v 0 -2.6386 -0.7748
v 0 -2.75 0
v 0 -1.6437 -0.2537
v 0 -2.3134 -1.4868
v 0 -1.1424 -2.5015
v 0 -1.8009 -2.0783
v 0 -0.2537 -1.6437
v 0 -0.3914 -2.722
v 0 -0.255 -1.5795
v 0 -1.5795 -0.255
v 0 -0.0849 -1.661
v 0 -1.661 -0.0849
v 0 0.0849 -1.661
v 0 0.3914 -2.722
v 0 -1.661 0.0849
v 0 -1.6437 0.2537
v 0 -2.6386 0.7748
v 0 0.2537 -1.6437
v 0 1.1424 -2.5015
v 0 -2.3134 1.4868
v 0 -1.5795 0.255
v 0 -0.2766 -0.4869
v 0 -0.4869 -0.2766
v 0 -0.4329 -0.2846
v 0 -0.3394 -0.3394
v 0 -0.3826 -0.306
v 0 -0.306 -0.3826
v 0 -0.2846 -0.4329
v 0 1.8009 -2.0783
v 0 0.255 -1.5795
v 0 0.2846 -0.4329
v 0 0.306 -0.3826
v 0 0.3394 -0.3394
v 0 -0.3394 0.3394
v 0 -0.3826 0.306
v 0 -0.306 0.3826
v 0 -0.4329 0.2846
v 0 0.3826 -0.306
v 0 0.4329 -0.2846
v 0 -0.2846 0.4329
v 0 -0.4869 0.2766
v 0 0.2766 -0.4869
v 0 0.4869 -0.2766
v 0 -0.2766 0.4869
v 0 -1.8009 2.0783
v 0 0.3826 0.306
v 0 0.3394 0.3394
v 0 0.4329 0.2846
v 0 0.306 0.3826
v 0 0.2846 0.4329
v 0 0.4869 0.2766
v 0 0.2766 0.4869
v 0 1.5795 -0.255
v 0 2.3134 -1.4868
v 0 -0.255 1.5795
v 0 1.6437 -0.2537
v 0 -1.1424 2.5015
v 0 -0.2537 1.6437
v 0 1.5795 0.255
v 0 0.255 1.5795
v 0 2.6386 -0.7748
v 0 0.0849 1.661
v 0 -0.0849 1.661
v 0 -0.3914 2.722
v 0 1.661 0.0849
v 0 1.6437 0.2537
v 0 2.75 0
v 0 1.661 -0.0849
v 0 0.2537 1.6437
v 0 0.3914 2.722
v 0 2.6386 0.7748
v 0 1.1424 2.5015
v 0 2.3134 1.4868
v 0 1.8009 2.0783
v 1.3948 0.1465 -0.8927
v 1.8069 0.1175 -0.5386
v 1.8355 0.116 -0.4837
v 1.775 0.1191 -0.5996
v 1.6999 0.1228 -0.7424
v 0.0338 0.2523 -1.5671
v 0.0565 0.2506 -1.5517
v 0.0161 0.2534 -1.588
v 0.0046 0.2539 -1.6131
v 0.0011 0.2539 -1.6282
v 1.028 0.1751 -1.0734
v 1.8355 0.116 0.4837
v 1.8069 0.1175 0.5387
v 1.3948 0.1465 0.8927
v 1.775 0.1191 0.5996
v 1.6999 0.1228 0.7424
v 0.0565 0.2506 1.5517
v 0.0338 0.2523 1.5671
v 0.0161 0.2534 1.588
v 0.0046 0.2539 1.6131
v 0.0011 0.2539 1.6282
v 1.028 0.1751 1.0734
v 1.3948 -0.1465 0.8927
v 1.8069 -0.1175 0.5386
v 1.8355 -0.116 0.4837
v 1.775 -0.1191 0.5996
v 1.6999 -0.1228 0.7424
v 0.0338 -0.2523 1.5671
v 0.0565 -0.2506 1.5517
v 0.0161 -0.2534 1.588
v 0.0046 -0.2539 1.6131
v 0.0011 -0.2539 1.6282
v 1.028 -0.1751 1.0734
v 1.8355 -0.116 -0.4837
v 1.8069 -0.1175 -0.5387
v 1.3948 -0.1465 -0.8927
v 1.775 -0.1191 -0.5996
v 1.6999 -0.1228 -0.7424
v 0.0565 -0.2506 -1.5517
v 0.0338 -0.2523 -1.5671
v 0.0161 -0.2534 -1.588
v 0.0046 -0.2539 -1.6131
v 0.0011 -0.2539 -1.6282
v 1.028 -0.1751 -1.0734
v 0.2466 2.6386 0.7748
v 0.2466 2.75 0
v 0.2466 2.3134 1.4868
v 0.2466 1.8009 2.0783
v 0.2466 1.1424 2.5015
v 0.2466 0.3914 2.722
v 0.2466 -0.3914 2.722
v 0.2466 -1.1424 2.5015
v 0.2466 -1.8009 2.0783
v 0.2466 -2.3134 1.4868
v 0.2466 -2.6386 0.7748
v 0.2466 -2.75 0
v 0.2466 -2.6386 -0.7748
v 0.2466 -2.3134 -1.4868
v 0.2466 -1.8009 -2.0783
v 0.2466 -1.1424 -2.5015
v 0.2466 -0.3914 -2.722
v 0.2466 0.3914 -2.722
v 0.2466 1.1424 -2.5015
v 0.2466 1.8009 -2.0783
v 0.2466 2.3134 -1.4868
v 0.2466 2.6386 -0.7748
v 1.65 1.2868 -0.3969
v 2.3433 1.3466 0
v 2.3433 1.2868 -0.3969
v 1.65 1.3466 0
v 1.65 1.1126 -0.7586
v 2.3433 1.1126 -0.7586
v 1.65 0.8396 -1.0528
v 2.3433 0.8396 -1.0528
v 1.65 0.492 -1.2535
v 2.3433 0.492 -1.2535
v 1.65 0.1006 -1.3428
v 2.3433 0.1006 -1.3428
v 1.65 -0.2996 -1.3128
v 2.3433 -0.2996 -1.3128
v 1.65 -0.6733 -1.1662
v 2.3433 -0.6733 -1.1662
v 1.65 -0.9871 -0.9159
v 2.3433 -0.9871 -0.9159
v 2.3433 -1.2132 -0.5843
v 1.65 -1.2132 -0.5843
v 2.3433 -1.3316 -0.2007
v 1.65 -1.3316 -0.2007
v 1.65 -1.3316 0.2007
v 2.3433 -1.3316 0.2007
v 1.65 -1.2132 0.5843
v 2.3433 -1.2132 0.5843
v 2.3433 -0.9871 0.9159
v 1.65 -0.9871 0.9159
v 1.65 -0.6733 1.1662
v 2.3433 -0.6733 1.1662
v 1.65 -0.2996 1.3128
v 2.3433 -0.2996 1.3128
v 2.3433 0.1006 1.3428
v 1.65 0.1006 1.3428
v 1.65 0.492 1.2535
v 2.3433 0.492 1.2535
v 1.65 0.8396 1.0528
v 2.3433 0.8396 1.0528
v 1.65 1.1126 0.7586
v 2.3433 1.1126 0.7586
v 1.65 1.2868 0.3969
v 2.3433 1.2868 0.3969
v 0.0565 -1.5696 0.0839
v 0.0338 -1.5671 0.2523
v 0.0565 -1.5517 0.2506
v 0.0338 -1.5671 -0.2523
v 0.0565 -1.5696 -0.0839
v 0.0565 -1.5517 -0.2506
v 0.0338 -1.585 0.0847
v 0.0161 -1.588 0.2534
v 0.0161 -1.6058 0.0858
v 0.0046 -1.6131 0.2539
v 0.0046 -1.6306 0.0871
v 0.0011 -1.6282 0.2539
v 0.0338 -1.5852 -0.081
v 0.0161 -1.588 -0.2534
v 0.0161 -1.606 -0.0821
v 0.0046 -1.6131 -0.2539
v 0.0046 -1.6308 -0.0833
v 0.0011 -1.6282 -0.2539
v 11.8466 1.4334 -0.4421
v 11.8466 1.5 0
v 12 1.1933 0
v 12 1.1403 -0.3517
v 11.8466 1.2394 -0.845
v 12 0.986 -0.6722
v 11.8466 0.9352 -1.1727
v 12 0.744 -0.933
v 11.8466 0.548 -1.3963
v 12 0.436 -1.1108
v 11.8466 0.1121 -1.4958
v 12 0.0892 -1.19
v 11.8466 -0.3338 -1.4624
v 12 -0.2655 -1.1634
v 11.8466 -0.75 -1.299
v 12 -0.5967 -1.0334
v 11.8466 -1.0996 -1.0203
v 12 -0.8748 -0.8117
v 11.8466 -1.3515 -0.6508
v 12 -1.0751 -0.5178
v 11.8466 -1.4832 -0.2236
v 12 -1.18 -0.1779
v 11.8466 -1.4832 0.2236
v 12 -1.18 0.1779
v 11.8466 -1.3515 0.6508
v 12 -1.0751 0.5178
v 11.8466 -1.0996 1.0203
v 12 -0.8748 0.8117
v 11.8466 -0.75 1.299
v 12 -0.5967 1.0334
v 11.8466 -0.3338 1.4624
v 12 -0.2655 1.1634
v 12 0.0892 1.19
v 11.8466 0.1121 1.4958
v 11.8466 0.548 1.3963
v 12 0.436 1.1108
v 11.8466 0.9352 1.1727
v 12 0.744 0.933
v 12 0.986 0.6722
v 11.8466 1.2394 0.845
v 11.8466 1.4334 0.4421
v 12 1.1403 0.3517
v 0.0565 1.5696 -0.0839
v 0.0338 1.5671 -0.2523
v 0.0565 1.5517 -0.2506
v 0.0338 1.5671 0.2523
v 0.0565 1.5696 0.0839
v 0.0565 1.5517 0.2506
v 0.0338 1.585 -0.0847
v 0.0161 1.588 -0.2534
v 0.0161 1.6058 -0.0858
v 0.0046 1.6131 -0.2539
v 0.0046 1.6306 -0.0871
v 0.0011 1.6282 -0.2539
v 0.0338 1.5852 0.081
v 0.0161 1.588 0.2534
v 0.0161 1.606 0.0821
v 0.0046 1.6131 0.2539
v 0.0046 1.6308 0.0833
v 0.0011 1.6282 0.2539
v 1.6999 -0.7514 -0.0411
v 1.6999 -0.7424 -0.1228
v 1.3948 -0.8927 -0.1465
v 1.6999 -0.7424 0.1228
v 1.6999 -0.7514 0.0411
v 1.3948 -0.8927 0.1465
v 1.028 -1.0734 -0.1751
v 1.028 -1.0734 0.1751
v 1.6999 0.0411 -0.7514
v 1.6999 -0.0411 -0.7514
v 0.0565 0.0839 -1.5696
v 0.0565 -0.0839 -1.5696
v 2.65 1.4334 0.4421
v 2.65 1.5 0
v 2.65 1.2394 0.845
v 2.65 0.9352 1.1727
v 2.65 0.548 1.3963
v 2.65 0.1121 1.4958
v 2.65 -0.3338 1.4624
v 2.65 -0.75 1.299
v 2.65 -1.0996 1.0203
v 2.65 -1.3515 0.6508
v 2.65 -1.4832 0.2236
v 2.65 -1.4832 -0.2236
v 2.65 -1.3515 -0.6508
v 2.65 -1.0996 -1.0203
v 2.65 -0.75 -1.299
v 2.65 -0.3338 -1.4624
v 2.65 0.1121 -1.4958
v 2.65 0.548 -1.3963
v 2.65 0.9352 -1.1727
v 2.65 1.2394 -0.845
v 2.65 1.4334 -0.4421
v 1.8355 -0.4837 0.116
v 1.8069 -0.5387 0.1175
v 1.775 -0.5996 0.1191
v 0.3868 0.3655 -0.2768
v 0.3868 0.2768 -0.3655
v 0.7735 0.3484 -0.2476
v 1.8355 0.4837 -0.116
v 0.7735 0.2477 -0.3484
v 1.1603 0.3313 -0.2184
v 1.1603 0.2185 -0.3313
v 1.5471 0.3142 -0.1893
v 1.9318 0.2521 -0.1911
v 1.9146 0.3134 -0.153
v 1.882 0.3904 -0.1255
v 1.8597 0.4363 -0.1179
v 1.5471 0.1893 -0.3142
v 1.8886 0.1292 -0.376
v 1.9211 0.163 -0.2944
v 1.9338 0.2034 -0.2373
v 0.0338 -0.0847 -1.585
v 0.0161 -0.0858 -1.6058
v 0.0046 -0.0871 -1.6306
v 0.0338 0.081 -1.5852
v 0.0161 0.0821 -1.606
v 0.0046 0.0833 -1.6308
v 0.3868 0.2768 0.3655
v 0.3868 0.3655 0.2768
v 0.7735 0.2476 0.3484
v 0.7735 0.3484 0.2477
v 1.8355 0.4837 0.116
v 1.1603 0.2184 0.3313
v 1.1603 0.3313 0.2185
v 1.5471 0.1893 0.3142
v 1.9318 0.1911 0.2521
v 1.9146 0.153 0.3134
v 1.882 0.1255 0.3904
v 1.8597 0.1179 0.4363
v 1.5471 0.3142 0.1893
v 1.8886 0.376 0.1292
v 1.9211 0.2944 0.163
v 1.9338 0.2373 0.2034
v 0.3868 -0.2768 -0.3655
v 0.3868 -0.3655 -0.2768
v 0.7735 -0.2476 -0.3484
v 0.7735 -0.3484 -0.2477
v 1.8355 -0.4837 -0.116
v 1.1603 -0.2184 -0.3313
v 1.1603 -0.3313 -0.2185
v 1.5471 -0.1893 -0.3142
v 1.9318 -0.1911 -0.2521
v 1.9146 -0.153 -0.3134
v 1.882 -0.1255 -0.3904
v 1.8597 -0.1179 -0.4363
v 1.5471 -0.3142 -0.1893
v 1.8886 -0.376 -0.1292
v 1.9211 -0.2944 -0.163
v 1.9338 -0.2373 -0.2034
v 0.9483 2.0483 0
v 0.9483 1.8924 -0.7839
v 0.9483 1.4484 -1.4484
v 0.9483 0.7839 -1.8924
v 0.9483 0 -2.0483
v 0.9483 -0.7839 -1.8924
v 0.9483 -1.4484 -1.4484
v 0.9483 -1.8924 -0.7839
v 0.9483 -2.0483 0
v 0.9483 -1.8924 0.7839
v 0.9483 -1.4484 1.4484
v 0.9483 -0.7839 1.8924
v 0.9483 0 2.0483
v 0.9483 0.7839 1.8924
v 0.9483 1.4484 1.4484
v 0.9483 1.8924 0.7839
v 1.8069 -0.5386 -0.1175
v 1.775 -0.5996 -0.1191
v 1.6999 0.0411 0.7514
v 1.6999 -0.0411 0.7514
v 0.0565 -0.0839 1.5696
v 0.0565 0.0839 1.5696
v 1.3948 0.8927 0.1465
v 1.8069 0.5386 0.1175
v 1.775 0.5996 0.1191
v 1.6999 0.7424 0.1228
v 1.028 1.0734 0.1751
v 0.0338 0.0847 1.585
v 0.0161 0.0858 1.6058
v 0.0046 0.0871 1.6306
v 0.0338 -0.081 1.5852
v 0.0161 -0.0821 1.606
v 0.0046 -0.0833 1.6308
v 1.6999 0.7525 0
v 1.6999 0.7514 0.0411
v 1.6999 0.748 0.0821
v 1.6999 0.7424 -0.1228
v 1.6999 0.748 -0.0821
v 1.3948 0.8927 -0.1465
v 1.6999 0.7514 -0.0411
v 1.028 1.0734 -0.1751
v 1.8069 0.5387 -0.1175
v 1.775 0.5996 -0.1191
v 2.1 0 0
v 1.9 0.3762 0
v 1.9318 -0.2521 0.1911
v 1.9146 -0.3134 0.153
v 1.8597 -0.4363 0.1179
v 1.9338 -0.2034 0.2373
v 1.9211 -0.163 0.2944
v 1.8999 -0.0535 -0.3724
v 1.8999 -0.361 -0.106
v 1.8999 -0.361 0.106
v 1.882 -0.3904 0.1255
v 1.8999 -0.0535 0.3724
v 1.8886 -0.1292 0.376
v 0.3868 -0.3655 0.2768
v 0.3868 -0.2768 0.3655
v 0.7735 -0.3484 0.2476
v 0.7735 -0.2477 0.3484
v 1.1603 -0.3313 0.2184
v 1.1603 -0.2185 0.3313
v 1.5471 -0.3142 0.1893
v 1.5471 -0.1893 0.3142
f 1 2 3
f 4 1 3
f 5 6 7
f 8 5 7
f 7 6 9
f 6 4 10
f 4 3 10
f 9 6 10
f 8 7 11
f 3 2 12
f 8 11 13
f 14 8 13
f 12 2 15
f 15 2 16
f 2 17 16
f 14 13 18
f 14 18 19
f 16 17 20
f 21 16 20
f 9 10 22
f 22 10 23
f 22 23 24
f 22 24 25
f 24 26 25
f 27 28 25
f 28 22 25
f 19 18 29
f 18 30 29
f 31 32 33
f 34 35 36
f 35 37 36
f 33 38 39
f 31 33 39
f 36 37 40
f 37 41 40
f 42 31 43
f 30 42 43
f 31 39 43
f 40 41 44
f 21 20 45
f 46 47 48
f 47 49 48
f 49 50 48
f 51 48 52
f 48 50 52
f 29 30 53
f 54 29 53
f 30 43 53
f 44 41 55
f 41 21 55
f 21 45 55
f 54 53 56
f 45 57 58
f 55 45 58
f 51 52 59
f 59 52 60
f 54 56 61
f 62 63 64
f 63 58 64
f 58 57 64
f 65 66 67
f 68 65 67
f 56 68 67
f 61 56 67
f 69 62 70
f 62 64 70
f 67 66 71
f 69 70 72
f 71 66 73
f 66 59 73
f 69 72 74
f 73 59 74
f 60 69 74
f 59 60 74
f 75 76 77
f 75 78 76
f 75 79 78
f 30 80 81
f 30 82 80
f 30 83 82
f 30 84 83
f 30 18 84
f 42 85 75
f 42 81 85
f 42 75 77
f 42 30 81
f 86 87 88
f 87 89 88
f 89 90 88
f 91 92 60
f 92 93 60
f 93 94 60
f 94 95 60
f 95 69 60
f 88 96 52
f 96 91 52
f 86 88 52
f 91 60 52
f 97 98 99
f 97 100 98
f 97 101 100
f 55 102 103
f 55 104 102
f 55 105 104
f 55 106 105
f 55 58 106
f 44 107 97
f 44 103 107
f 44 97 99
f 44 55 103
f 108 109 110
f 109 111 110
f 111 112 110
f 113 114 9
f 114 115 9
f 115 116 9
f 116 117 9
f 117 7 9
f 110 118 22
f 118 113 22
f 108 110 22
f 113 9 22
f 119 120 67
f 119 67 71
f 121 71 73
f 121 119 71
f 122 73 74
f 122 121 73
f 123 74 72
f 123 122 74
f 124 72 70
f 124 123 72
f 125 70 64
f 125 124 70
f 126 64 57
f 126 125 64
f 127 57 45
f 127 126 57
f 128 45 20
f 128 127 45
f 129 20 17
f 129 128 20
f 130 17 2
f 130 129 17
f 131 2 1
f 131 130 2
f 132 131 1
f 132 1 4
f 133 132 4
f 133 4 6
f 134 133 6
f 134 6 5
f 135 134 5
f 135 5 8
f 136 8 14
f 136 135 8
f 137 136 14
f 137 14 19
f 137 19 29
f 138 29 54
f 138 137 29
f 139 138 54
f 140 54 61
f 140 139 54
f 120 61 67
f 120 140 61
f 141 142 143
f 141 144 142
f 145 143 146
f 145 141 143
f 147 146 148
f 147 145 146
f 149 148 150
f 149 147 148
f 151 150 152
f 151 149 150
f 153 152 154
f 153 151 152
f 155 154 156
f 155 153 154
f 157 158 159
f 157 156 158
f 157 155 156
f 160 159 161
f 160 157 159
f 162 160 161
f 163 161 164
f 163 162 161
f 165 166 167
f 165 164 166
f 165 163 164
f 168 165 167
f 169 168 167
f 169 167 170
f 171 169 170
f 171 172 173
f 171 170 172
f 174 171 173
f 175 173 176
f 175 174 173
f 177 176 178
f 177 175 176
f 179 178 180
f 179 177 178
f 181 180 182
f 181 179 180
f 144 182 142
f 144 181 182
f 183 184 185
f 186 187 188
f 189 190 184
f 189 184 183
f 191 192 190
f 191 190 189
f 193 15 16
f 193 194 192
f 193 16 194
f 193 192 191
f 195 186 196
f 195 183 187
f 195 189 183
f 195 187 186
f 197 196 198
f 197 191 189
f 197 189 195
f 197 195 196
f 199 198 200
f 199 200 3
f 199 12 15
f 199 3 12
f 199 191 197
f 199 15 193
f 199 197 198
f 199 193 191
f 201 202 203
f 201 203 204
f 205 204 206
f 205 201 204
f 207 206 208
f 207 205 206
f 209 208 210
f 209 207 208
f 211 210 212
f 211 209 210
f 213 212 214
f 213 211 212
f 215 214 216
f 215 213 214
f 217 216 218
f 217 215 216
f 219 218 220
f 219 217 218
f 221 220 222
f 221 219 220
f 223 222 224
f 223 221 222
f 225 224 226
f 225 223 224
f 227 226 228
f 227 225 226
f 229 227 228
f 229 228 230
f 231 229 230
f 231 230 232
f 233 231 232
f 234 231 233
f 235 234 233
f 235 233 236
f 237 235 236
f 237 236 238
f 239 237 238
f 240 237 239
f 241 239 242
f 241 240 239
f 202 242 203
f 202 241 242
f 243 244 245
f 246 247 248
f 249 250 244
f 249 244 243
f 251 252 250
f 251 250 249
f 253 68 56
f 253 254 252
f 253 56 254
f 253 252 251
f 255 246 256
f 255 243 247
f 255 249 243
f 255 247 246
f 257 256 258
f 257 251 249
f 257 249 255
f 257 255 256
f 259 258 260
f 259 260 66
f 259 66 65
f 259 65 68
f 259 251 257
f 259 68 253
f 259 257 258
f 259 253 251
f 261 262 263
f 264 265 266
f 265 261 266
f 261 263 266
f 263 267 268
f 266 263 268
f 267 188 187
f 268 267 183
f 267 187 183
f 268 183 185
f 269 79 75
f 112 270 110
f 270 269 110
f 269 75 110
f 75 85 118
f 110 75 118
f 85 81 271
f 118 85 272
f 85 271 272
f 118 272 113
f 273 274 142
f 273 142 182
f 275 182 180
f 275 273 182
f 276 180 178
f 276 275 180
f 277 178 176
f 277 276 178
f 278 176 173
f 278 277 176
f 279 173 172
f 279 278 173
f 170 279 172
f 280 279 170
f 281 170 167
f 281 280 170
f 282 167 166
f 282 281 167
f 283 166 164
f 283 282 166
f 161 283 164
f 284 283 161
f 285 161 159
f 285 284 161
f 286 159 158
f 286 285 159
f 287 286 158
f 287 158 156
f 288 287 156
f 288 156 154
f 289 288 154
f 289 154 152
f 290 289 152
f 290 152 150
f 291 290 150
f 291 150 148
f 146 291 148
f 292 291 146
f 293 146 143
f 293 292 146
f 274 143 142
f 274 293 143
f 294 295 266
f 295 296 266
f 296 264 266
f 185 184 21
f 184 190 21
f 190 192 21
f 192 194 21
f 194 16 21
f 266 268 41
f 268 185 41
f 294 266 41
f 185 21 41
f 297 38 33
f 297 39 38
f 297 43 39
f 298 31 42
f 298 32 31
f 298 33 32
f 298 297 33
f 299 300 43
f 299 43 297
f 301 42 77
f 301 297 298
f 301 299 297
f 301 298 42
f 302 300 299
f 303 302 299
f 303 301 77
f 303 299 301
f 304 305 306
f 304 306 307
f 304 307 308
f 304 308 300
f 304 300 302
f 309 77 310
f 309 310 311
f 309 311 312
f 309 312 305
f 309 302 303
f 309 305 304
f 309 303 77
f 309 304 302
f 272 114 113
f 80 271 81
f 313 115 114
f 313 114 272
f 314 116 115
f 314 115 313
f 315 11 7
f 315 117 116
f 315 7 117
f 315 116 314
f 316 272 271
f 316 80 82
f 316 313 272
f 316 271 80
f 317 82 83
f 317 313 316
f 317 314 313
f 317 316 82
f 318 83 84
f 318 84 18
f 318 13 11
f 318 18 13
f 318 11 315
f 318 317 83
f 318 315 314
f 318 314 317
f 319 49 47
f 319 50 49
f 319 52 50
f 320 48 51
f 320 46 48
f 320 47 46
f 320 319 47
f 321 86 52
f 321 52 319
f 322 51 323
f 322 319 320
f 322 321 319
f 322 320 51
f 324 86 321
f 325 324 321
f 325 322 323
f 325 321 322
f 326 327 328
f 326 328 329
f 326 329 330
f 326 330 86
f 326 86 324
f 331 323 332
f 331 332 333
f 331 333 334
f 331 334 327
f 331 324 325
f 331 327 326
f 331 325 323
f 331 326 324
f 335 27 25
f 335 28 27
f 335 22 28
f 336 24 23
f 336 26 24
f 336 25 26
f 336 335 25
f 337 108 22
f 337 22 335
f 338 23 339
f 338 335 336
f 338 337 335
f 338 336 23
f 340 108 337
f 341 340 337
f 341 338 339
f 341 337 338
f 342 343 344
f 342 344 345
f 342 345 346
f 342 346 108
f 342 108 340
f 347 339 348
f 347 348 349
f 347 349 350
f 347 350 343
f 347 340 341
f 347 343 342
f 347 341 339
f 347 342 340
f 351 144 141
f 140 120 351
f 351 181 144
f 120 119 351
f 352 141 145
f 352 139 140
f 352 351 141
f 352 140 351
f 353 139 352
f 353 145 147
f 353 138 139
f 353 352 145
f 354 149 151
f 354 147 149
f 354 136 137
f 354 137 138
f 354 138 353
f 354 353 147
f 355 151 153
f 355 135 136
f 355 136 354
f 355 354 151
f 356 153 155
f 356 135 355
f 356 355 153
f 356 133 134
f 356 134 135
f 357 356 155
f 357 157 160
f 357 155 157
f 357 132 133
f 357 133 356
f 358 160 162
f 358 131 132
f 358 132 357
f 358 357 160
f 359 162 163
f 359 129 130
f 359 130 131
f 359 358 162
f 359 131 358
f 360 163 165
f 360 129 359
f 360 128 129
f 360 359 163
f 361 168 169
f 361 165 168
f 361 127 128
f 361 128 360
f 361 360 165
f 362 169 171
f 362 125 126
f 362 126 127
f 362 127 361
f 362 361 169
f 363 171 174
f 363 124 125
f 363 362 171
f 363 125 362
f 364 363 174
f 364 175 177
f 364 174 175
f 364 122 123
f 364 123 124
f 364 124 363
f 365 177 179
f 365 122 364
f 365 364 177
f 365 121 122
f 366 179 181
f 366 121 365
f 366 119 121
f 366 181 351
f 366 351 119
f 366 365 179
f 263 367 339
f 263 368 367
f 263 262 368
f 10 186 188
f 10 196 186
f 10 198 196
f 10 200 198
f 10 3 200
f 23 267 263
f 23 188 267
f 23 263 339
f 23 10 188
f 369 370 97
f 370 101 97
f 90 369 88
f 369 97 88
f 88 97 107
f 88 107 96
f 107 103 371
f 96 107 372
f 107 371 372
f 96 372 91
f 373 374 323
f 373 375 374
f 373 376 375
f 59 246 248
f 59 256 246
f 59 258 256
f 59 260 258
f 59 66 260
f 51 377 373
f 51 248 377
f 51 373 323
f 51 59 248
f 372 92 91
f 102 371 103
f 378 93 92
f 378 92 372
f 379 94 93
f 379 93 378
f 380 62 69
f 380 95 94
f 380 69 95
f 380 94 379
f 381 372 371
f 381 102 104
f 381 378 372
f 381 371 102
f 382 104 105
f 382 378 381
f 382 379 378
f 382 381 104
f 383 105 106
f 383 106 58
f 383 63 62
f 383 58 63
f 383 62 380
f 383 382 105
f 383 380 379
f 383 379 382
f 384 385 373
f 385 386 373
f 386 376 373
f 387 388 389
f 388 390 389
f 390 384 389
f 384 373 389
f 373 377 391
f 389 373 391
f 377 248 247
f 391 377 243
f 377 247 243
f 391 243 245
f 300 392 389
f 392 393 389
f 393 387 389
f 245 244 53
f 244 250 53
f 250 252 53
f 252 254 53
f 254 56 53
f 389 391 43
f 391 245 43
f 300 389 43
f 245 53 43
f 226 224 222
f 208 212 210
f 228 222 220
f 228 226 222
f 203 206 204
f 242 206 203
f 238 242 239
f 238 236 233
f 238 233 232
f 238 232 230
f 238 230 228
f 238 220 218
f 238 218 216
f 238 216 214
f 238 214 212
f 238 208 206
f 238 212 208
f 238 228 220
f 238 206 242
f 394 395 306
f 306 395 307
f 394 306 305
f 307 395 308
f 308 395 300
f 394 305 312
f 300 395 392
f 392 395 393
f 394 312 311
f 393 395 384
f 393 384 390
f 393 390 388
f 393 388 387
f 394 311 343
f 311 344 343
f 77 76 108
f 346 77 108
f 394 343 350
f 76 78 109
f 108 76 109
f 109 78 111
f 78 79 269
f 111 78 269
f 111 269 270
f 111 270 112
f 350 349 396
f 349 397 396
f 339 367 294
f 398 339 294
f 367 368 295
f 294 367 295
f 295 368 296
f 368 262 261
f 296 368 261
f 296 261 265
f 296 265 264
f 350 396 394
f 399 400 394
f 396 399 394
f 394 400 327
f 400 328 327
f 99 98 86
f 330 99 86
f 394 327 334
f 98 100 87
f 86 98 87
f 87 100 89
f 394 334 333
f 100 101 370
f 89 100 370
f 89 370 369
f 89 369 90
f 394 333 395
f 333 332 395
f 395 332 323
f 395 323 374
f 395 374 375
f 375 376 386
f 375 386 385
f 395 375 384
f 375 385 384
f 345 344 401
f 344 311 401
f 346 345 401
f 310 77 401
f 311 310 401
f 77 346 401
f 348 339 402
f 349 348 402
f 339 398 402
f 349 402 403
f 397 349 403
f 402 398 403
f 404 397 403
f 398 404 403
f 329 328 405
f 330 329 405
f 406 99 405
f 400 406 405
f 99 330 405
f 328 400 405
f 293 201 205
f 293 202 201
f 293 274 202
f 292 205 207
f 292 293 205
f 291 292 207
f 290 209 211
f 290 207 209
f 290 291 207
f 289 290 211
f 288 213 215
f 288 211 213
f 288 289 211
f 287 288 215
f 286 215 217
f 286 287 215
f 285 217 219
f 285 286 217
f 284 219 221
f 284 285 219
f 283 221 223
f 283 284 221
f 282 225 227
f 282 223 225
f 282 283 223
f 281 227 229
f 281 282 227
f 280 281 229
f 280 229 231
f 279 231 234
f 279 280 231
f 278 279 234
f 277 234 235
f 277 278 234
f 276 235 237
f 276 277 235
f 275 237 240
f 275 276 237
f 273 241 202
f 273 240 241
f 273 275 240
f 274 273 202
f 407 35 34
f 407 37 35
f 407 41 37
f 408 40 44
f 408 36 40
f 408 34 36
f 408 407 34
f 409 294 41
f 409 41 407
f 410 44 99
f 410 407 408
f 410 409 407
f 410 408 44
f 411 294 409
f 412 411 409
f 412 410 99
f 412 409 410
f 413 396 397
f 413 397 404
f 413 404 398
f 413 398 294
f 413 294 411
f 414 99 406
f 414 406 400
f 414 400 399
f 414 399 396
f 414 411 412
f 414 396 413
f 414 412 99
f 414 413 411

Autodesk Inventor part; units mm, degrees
ref_plane "YZ Plane" through (0, 0, 0) normal (1, 0, 0) x (0, 1, 0)
ref_plane "XZ Plane" through (0, 0, 0) normal (0, 1, 0) x (-1, 0, 0)
sketch "Sketch1" plane through (0, 0, 0) normal (0, 0, 1) x (1, 0, 0)
  line L0 (2.1, 0) -> (12, 0)
  line L1 (12, 0) -> (12, 1.5)
  line L2 (12, 1.5) -> (2.65, 1.5)
  line L3 (2.65, 1.5) -> (2.3433, 1.3466)
  line L4 (2.3433, 1.3466) -> (1.65, 1.3466)
  line L5 (0, 2.75) -> (0, 1.6)
  line L6 (0, 1.6) -> (1.6999, 0.7525)
  line L7 (1.6999, 0.7525) -> (2.1, 0)
  line L8 (-2.4, 0) -> (14.4, 0) projected
  line L9 (0, -0.55) -> (0, 3.3) projected
  line L10 (0, 2.75) -> (0.2466, 2.75)
  line L11 (0.2466, 2.75) -> (1.65, 1.3466)
  line L12 (2.65, 1.5) -> (1.4966, 1.5) construction
  dimension "d1" = 9.35
  dimension "d2" = 3
  dimension "d3" = 2.6933
  dimension "d4" = 3.2
  dimension "d5" = 26.5
  dimension "d6" = 62
  dimension "d7" = 2.1
  dimension "d8" = 0.3067
  dimension "d12" = 5.5
  dimension "d13" = 45
  dimension "d15" = 12
  dimension "d24" = 1.65
revolve "Body" add sketch "Sketch1" angle 360 about axis through (2.1, 0, 0) along (1, 0, 0) contours L7 L6 L5 L10 L11 L4 L3 L2 L1 L0
sketch "Sketch2" plane through (0, 0, 0) normal (-1, 0, 0) x (0, 0, 1)
  line L0 (0, 1.6) -> (0, 0) construction
  line L1 (0, 0) -> (1.6, 0) construction
  arc A0 (0.48, 0) -> (0, 0.48) centre (0, 0) ccw construction
  arc A1 (0.56, 0) -> (0, 0.56) centre (0, 0) ccw construction
  arc A2 (1.5795, 0.255) -> (0.255, 1.5795) centre (0, 0) ccw
  line L2 (0, 0) -> (1.1314, 1.1314) construction
  line L3 (0.255, 1.5795) -> (0.2766, 0.4869)
  line L4 (1.5795, 0.255) -> (0.4869, 0.2766)
  arc A3 (0.255, 1.5795) -> (0, 1.6) centre (0, 0) ccw
  arc A4 (1.6, 0) -> (1.5795, 0.255) centre (0, 0) ccw
  line L5 (0, -3.85) -> (0, 3.85) projected
  line L6 (-3.85, 0) -> (3.85, 0) projected
  arc A5 (0.255, -1.5795) -> (1.5795, -0.255) centre (0, 0) ccw
  line L7 (0.255, -1.5795) -> (0.2766, -0.4869)
  line L8 (1.5795, -0.255) -> (0.4869, -0.2766)
  arc A6 (0, -1.6) -> (0.255, -1.5795) centre (0, 0) ccw
  arc A7 (1.5795, -0.255) -> (1.6, 0) centre (0, 0) ccw
  arc A8 (-0.255, 1.5795) -> (-1.5795, 0.255) centre (0, 0) ccw
  line L9 (-0.255, 1.5795) -> (-0.2766, 0.4869)
  line L10 (-1.5795, 0.255) -> (-0.4869, 0.2766)
  arc A9 (0, 1.6) -> (-0.255, 1.5795) centre (0, 0) ccw
  arc A10 (-1.5795, 0.255) -> (-1.6, 0) centre (0, 0) ccw
  arc A11 (-0.255, -1.5795) -> (0, -1.6) centre (0, 0) ccw
  arc A12 (-1.5795, -0.255) -> (-0.255, -1.5795) centre (0, 0) ccw
  arc A13 (-1.6, 0) -> (-1.5795, -0.255) centre (0, 0) ccw
  line L11 (-1.5795, -0.255) -> (-0.4869, -0.2766)
  line L12 (-0.255, -1.5795) -> (-0.2766, -0.4869)
  arc A14 (0.2766, 0.4869) -> (0.4869, 0.2766) centre (0.4912, 0.4912) ccw
  arc A15 (0.4869, -0.2766) -> (0.2766, -0.4869) centre (0.4912, -0.4912) ccw
  arc A16 (-0.4869, 0.2766) -> (-0.2766, 0.4869) centre (-0.4912, 0.4912) ccw
  arc A17 (-0.2766, -0.4869) -> (-0.4869, -0.2766) centre (-0.4912, -0.4912) ccw
  point P0 (1.1314, -1.1314)
  point P1 (-1.1314, 1.1314)
  point P2 (-1.1314, -1.1314)
  dimension "d17" = 0.96
  dimension "d18" = 1.12
  dimension "d19" = 3.2
  dimension "d20" = 45
  dimension "d21" = 0.255
extrude "Slot" add sketch "Sketch2" against normal up to next draft 5 contours L4 A14 L3 A2 | A5 L7 A15 L8 | L9 A16 L10 A8 | A12 L11 A17 L12
fillet "Fillet1" radius 0.102 4 edges at (0, 1.6, 0) (0, 0, -1.6) (0, -1.6, 0) (0, 0, 1.6)
thread "Thread" size "M3x0.5" class "6g" standard "ISO Metric profile" length 9.35
chamfer "Chamfer1" distance 0.3067 distance2 0.1534 1 edges at (12, -1.5, 0) measured on face at (12, 0.263, 0.1197)
ref_plane "Work Plane2" through (3.35, 0, 0) normal (0, 0, -1) x (1, 0, 0)
equation "\"d1\" = GEL"
equation "\"d2\" = GD"
equation "\"d3\" = BDM"
equation "\"d4\" = SDM"
equation "\"d7\" = INTI"
equation "\"d8\" = GAL"
equation "\"d12\" = KOD"
equation "\"d13\" = 0.5 * SEWI"
equation "\"d15\" = NLG"
equation "\"d24\" = KOH"
equation "\"d17\" = 0.3 * SDM"
equation "\"d18\" = 0.35 * SDM"
equation "\"d19\" = SDM"
equation "\"d21\" = 0.5 * SBR"
equation "\"d23\" = 0.2 * SBR"
equation "\"d10\" = GEL"
equation "\"d25\" = -0.5 * SPD + 0.5 * GD"
equation "\"d26\" = 0.5 * GAL"
equation "\"NLG\" = 12"
equation "\"GEL\" = 9.35"
equation "\"GAL\" = 0.61345 * PTC"
equation "\"SPD\" = NND - 1.2269 * PTC"
equation "\"KOD\" = 5.5"
equation "\"KOH\" = 1.65"
equation "\"SBR\" = 0.51"
equation "\"INTI\" = 2.1"
equation "\"SDM\" = 3.2"
equation "\"GD\" = NND"
equation "\"BDM\" = NND - GAL"
equation "\"SEWI\" = 90deg"
equation "\"d9\" = SDM"
equation "\"GUL\" = 0.61345 * PTC"
equation "\"TOA\" = 30deg"
equation "\"EPV\" = 3.15"
equation "\"THREADDIA\" = 3"
equation "\"PTC\" = 0.5"
equation "\"NND\" = 3"
equation "\"GD1\" = THREADDIA - 1.2269 * PTC"
properties part number "ISO 7046-1 - M3 x 12 - 4.8 - H" material "Steel"
